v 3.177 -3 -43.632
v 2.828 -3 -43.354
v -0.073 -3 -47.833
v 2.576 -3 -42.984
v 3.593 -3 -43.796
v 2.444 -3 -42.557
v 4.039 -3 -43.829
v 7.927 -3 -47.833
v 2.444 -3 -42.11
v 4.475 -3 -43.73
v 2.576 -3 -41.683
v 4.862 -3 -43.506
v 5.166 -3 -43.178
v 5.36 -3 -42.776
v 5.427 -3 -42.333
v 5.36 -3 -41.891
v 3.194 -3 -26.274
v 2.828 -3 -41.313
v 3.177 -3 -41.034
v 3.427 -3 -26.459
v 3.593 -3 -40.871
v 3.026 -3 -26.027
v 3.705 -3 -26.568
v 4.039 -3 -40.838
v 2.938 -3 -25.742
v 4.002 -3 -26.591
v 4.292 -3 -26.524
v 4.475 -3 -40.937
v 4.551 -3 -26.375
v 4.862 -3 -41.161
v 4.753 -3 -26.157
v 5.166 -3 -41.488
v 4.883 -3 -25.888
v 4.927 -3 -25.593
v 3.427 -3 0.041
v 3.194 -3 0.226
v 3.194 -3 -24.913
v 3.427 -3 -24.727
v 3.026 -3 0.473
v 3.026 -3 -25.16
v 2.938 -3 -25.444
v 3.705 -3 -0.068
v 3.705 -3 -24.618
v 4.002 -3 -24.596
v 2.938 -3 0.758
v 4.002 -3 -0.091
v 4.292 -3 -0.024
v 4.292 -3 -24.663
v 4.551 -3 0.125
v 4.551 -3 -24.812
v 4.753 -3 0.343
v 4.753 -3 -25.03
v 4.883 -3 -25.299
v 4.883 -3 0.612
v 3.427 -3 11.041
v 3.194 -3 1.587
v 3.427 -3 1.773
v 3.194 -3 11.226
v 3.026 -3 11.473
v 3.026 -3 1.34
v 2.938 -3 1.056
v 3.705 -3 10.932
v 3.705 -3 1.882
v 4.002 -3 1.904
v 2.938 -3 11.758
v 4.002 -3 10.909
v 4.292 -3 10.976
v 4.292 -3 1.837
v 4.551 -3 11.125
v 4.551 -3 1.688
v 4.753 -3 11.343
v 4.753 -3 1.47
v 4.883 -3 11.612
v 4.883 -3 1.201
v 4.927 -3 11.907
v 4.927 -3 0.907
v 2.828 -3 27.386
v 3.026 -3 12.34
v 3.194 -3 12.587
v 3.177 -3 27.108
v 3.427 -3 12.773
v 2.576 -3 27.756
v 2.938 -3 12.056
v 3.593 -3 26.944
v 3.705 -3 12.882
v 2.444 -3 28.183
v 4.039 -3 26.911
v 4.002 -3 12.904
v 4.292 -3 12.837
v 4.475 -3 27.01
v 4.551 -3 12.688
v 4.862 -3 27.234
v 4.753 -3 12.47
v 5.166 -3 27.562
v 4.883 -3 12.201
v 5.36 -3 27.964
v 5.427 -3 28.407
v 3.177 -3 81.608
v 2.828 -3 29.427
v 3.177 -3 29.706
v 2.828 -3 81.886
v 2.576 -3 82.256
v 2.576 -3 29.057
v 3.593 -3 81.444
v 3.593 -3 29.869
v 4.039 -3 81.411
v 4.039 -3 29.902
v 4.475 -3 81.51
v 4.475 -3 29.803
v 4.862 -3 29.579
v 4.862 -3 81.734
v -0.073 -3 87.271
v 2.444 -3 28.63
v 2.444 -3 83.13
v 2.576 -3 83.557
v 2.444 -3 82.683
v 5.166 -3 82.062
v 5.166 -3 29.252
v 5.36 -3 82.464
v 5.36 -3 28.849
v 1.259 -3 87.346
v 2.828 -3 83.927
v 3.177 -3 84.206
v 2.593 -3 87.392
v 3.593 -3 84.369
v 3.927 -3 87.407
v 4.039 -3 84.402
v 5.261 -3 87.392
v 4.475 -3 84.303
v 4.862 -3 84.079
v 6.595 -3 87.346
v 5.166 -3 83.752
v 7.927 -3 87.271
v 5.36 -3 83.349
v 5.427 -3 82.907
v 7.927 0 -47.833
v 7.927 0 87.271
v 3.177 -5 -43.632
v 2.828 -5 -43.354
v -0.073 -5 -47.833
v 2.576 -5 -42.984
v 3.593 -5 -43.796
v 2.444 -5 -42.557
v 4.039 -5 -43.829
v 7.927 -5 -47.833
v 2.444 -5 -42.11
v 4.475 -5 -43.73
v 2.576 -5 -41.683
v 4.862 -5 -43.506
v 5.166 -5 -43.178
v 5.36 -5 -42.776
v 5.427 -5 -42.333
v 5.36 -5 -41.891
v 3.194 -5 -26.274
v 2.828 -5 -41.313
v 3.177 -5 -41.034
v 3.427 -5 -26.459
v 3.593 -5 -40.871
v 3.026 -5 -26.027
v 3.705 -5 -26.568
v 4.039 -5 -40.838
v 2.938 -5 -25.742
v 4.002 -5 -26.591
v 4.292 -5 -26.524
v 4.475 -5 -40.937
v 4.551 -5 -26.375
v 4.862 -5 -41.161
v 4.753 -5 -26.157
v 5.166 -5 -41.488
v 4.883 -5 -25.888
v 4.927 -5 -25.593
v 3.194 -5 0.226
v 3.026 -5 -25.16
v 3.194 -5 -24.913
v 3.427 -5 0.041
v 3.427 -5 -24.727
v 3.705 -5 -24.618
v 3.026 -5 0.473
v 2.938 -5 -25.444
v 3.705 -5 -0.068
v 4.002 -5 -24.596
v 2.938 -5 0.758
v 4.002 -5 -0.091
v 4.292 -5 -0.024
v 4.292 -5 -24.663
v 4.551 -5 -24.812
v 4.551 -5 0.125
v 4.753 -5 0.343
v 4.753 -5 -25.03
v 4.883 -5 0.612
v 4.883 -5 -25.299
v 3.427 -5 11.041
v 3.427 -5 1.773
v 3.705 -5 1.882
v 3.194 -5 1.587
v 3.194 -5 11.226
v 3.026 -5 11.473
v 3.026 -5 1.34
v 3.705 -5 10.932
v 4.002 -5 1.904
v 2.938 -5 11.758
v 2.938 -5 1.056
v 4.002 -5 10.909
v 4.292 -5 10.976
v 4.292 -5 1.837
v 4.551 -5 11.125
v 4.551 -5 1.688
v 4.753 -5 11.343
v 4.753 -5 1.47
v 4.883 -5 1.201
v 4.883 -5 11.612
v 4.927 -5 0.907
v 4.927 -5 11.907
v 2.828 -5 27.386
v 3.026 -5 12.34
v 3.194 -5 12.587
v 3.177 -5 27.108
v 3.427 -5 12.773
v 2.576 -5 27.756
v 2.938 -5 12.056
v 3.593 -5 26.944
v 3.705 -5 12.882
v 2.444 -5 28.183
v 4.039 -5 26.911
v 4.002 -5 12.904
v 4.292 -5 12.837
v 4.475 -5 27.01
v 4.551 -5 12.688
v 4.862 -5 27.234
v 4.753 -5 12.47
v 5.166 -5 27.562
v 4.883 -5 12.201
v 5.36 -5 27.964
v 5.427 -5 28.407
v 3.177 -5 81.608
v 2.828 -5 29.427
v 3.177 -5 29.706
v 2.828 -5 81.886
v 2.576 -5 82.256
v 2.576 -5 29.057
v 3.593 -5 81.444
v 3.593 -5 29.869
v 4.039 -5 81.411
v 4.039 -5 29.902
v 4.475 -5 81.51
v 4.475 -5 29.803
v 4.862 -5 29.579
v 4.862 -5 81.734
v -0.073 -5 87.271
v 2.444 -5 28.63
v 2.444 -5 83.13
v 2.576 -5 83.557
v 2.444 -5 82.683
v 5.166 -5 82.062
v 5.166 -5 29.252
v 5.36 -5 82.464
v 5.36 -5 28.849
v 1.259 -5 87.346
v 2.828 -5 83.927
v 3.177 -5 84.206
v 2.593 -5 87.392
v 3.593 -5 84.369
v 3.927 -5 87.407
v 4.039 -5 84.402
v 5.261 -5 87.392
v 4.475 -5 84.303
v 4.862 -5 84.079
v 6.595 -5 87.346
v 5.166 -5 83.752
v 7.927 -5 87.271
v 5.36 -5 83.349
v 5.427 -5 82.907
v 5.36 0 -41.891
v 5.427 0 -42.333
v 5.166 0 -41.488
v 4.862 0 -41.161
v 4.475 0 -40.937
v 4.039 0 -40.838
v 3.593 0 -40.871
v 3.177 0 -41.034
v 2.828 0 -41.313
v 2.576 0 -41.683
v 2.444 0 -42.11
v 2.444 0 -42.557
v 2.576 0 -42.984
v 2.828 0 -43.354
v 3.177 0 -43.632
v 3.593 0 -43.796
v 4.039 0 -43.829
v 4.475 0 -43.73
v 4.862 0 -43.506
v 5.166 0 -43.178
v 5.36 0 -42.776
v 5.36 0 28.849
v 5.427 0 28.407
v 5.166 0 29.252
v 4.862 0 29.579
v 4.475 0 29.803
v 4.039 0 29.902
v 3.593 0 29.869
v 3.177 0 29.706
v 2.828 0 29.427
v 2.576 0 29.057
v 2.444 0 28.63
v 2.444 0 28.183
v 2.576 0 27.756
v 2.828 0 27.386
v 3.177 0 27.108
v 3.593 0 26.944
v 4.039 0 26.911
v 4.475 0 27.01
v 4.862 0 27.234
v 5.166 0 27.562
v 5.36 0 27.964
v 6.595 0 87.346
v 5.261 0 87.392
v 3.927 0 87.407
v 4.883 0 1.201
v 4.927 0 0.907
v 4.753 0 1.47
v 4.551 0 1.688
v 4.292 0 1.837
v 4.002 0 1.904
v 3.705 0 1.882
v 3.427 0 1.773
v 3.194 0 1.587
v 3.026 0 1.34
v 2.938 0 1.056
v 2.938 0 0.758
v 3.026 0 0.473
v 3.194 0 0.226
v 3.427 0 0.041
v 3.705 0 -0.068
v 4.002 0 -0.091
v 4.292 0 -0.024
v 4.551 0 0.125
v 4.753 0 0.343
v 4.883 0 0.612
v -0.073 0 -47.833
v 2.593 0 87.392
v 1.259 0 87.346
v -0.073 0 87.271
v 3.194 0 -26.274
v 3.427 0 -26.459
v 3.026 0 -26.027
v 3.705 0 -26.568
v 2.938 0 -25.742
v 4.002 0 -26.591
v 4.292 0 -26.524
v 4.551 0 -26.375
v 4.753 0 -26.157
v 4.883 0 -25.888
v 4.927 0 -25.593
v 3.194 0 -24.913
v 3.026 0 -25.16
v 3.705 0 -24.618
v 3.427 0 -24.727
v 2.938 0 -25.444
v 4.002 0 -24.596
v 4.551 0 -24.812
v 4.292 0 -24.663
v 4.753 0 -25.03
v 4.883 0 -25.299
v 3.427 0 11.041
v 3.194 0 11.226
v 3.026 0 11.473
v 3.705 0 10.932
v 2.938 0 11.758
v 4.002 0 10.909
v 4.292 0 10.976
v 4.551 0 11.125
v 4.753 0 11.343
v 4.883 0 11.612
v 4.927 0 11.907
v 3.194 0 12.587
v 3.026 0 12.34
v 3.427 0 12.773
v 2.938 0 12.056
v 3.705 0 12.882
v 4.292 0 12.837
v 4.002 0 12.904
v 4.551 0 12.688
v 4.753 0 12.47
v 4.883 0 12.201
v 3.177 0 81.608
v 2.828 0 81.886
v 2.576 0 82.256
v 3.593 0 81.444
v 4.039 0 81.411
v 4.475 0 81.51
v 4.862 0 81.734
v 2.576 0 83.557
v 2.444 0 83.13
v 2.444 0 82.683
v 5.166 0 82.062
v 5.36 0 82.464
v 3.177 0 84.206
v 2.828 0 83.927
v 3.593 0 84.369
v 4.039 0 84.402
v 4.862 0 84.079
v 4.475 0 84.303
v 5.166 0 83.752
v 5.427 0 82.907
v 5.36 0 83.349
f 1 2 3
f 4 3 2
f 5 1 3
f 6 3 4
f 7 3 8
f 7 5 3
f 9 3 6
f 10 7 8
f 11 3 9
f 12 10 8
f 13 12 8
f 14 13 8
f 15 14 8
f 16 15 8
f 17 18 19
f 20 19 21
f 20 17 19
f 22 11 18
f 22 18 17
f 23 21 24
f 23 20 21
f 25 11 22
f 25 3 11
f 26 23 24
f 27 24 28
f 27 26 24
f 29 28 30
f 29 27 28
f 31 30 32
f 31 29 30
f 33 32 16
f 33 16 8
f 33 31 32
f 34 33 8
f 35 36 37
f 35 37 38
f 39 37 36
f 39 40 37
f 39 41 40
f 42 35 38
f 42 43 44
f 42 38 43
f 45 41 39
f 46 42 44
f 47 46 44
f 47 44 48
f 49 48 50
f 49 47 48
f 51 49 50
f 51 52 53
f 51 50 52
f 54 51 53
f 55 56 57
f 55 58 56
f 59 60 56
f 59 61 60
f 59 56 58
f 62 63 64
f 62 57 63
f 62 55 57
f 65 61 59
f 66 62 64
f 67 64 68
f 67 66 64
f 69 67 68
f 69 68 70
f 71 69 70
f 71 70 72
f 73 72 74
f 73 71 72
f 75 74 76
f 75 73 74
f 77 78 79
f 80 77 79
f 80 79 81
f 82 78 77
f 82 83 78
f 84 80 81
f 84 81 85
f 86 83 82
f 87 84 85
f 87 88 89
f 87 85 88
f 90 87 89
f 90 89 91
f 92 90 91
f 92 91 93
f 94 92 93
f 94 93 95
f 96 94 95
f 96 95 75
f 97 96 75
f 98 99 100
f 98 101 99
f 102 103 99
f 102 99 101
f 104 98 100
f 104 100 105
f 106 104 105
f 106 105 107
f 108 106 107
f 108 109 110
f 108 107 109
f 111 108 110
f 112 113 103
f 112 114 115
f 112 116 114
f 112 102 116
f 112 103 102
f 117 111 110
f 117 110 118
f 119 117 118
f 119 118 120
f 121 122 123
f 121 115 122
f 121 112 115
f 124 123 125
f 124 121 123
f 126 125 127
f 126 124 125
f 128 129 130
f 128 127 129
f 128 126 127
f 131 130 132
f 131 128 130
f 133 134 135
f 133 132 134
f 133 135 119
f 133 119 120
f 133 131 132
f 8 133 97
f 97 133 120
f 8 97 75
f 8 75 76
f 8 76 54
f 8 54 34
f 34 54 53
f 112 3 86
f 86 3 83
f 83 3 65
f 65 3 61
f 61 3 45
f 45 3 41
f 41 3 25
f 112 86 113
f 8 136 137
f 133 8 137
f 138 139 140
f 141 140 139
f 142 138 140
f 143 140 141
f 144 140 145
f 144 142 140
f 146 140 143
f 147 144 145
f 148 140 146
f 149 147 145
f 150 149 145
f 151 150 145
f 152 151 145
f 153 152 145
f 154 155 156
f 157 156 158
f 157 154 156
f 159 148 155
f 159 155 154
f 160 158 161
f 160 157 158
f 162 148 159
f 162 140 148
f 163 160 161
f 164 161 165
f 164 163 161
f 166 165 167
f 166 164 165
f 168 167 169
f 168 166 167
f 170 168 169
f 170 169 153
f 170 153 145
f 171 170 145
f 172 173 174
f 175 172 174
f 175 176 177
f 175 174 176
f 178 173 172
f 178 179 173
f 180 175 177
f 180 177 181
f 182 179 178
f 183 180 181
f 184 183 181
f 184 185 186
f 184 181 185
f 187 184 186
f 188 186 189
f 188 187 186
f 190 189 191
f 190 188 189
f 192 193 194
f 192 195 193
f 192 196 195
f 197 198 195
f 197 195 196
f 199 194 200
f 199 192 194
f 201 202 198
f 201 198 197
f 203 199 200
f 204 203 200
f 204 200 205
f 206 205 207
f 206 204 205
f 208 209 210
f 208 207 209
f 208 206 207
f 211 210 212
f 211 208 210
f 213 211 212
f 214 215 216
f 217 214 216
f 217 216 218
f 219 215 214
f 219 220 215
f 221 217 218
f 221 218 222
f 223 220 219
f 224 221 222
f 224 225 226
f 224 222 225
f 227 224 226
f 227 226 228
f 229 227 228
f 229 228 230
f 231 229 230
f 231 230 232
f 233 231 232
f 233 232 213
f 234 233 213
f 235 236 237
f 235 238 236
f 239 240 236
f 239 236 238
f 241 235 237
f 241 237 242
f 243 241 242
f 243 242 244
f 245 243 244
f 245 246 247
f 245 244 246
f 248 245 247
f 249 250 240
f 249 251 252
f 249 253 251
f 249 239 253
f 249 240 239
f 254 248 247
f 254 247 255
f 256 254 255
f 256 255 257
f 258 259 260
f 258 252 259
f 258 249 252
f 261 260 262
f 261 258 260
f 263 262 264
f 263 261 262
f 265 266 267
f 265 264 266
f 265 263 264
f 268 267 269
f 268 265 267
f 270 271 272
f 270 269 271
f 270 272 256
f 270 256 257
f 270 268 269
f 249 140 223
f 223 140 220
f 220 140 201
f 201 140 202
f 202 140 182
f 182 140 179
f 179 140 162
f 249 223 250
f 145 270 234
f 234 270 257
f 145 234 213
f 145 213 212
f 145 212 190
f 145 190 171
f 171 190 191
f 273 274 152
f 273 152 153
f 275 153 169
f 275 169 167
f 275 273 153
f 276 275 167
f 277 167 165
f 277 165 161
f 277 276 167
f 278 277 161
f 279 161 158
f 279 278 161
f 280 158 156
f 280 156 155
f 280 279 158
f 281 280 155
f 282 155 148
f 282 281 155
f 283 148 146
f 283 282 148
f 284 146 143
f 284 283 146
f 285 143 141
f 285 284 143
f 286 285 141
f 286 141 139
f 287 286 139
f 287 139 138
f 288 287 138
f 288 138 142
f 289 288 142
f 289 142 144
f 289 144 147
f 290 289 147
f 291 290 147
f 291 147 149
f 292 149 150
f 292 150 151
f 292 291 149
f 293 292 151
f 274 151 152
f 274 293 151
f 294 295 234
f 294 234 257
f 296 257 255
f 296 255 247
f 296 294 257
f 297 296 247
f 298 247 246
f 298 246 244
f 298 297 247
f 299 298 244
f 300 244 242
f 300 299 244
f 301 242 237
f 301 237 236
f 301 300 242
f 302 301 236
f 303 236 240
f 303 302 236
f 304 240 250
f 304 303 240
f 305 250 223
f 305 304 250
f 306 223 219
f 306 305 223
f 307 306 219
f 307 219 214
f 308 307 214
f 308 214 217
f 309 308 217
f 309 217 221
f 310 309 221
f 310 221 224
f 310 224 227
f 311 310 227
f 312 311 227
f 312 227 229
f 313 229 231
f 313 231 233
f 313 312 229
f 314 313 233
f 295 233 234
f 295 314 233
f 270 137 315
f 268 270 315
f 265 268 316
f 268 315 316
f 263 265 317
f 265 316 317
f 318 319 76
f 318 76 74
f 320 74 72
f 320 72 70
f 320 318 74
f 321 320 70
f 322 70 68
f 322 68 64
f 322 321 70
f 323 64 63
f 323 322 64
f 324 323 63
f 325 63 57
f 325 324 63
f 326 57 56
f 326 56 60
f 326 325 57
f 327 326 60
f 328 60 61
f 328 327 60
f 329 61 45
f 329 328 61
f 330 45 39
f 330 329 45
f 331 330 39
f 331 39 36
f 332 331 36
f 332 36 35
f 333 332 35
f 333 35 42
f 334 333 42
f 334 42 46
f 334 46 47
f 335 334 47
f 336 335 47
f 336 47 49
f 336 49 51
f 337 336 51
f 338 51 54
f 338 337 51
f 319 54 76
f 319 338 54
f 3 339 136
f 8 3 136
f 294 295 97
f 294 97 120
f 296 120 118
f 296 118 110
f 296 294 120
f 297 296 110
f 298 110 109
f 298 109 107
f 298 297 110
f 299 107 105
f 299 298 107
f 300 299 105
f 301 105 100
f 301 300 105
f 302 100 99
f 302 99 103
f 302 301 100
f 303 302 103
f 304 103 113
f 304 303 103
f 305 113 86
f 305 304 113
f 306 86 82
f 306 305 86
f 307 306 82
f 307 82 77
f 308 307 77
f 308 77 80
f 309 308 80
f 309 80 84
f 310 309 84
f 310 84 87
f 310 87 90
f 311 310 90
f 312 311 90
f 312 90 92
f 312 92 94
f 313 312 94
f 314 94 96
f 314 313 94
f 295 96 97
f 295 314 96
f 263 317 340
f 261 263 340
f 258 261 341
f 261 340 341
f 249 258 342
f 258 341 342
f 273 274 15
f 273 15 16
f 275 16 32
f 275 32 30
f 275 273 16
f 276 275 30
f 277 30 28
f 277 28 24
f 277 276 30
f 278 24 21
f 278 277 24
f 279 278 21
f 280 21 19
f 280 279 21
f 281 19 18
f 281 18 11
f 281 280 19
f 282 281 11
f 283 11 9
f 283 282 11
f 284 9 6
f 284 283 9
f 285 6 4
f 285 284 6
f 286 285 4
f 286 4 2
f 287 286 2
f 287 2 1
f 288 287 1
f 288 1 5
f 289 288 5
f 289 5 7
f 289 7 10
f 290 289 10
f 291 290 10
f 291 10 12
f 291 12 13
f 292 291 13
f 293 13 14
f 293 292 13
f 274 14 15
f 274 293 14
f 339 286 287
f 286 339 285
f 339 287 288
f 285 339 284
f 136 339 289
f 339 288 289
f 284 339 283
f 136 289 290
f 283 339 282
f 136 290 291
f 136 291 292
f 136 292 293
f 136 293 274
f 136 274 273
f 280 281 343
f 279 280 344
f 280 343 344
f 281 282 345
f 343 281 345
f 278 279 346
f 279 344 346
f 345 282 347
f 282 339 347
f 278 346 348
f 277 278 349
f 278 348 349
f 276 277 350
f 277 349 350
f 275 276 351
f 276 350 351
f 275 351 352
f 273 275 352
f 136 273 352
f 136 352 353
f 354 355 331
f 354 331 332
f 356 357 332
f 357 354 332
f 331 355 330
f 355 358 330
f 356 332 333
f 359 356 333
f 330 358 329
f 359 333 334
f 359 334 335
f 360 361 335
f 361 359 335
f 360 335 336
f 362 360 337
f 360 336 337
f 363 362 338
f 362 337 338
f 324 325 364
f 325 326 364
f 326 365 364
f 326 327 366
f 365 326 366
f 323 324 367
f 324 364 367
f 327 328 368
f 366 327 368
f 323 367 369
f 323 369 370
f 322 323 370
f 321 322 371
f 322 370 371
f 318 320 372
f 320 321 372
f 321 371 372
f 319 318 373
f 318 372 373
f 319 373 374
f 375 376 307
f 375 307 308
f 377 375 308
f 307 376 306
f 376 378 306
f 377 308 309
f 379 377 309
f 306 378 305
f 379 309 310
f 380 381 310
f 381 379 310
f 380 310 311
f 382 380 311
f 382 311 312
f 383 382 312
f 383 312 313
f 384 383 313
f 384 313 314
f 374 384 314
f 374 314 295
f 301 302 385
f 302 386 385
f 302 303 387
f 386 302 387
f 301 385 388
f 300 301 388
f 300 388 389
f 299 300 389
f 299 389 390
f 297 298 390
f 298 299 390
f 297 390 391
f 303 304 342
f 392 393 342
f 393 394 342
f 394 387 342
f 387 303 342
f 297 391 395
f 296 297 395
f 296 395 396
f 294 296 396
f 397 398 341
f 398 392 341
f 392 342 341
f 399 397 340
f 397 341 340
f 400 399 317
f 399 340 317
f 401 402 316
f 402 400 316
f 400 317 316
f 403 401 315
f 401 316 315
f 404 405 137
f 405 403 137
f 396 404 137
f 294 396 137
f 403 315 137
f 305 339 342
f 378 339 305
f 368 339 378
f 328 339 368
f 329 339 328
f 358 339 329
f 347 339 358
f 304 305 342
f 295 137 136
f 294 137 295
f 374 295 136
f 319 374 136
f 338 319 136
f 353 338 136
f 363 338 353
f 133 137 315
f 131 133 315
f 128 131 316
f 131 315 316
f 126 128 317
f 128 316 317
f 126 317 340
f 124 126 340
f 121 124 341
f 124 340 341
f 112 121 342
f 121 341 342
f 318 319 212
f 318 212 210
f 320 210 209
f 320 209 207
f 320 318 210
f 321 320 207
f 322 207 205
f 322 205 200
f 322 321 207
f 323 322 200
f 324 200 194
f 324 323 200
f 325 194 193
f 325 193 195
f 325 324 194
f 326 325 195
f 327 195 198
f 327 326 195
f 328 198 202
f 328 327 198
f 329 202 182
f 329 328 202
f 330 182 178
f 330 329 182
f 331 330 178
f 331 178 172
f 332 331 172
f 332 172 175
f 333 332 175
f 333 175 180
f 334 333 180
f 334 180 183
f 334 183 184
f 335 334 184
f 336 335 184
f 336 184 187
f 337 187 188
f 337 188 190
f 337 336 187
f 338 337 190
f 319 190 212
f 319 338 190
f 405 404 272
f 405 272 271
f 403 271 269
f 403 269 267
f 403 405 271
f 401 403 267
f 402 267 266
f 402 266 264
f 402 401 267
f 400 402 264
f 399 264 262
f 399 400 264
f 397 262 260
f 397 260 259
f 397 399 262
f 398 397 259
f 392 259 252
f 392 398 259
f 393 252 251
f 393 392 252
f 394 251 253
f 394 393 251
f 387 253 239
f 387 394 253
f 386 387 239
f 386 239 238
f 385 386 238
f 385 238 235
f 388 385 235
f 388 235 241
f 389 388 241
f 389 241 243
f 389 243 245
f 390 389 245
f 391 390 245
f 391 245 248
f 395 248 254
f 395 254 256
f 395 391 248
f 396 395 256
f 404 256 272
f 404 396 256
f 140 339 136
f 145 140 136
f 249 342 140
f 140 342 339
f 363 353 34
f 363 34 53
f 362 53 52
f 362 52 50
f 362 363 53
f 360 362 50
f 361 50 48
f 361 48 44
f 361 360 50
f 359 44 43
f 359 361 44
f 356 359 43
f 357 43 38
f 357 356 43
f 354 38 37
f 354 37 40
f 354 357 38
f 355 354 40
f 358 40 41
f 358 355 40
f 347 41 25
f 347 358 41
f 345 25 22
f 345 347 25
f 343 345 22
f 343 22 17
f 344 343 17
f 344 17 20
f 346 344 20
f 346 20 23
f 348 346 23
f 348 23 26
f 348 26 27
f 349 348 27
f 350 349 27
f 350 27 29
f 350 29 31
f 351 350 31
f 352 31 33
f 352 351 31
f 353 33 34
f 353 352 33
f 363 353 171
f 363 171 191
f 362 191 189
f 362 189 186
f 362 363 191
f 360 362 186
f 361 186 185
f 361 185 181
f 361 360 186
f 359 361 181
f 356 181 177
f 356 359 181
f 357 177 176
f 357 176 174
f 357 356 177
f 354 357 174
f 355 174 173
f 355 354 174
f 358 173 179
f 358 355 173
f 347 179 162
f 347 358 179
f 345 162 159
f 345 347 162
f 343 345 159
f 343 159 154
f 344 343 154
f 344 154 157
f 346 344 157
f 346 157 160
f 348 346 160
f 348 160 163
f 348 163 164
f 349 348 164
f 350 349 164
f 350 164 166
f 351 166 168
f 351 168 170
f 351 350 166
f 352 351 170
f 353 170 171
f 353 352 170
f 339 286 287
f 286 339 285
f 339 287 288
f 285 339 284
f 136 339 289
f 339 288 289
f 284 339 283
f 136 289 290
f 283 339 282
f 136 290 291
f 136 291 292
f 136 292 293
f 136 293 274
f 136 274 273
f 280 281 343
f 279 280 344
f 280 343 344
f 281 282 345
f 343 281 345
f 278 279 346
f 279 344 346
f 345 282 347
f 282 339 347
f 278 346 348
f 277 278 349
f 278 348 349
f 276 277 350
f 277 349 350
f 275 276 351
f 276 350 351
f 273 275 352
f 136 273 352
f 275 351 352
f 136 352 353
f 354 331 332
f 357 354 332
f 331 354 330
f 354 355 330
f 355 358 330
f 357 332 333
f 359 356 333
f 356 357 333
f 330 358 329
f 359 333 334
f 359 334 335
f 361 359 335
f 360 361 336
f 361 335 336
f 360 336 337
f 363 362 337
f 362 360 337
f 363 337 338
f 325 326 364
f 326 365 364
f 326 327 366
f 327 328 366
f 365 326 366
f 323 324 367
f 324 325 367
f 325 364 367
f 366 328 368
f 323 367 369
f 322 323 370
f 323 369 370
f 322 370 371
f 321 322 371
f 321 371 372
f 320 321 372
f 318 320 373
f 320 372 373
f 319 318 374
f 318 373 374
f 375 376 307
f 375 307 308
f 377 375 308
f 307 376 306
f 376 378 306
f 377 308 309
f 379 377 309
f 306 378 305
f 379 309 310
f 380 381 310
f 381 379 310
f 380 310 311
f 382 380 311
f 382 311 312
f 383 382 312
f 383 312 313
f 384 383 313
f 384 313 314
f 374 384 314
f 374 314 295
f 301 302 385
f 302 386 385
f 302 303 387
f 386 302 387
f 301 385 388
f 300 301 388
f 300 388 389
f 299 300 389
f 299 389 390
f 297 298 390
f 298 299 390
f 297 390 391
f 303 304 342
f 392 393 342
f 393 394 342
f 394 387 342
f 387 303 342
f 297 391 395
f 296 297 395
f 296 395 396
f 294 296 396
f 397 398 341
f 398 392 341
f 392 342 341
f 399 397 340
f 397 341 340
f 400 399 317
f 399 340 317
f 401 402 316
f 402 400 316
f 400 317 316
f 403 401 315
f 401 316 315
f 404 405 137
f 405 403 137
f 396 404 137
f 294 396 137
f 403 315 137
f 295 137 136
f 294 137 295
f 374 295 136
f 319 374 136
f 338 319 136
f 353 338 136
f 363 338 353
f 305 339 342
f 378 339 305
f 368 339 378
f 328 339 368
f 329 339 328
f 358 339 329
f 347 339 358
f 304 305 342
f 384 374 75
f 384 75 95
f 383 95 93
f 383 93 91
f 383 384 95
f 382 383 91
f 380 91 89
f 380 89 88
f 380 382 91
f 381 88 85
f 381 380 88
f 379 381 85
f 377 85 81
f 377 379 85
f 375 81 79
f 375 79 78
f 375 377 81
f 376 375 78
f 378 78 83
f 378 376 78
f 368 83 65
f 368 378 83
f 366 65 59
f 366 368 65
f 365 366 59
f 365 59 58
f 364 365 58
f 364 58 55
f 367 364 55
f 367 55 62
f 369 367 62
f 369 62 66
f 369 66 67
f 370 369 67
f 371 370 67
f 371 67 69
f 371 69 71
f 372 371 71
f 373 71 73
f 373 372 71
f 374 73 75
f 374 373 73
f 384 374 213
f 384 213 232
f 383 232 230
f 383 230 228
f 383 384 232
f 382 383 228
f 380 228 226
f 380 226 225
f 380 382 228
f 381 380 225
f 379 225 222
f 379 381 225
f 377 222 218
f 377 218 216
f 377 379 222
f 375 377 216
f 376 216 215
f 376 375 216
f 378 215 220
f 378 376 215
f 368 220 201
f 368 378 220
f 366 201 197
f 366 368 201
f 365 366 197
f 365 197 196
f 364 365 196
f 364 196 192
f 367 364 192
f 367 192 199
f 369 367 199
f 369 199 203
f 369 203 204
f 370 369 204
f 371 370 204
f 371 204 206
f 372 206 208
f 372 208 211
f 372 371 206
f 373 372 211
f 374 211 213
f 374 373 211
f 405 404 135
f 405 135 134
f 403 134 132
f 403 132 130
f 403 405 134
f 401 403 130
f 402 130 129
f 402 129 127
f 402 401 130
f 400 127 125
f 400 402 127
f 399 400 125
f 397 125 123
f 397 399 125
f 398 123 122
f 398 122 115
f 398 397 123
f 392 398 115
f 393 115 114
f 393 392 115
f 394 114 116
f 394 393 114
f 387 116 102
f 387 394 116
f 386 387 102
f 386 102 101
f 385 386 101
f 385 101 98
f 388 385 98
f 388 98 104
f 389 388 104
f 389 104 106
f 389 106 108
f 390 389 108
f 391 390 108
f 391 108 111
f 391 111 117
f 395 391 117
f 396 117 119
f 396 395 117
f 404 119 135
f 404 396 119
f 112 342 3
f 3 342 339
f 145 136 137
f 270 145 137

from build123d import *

# Parameters (mm, degrees)
F0_W     = 8
F0_H     = 9.6326530612
F0_R     = 1.5
F0_R_2   = 1
F1_DEPTH = 5
F2_DEPTH = 3


# Not quite as in the source:
# - a feature names something its author has since deleted; it is built from what else it names


with BuildPart() as f1:
    # F0 (on Front) → F1 (new body)
    with BuildSketch(Plane.XZ):
        with BuildLine():
            Line((-0.072881, 79.2495112755), (-0.072881, 33.2229425306))
            Line((-0.072881, 33.2229425306), (7.927119, 33.2229425306))
            Line((7.927119, 33.2229425306), (7.927119, 79.2495112755))
            ThreePointArc((7.927119, 79.2495112755), (3.927119, 79.406616), (-0.072881, 79.2495112755))
        make_face()
        with Locations((3.927119, 28.406616)):
            Rectangle(F0_W, F0_H)
        with Locations((3.927119, 28.406616)):
            Circle(F0_R, mode=Mode.SUBTRACT)
        with BuildLine():
            Line((7.927119, 23.5902894694), (-0.072881, 23.5902894694))
            Line((-0.072881, 23.5902894694), (-0.072881, -22.4362792755))
            ThreePointArc((-0.072881, -22.4362792755), (3.927119, -22.593384), (7.927119, -22.4362792755))
            Line((7.927119, -22.4362792755), (7.927119, 23.5902894694))
        make_face()
        with Locations((3.927119, 0.906616)):
            Circle(F0_R_2, mode=Mode.SUBTRACT)
        with Locations((3.927119, 11.906616)):
            Circle(F0_R_2, mode=Mode.SUBTRACT)
        with BuildLine():
            Line((-0.072881, 87.270866611), (-0.072881, 79.2495112755))
            ThreePointArc((-0.072881, 79.2495112755), (3.927119, 79.406616), (7.927119, 79.2495112755))
            Line((7.927119, 79.2495112755), (7.927119, 87.270866611))
            ThreePointArc((7.927119, 87.270866611), (5.9282704121, 87.3726688866), (3.927119, 87.406616))
            ThreePointArc((3.927119, 87.406616), (1.9259675879, 87.3726688866), (-0.072881, 87.270866611))
        make_face()
        with Locations((3.927119, 82.906616)):
            Circle(F0_R, mode=Mode.SUBTRACT)
        with BuildLine():
            ThreePointArc((7.927119, -22.4362792755), (3.927119, -22.593384), (-0.072881, -22.4362792755))
            Line((-0.072881, -22.4362792755), (-0.072881, -30.457634611))
            ThreePointArc((-0.072881, -30.457634611), (3.927119, -30.593384), (7.927119, -30.457634611))
            Line((7.927119, -30.457634611), (7.927119, -22.4362792755))
        make_face()
        with Locations((3.927119, -25.593384)):
            Circle(F0_R_2, mode=Mode.SUBTRACT)
        with BuildLine():
            ThreePointArc((7.927119, -30.457634611), (3.927119, -30.593384), (-0.072881, -30.457634611))
            Line((-0.072881, -30.457634611), (-0.072881, -47.833384))
            Line((-0.072881, -47.833384), (7.927119, -47.833384))
            Line((7.927119, -47.833384), (7.927119, -30.457634611))
        make_face()
        with Locations((3.927119, -42.333384)):
            Circle(F0_R, mode=Mode.SUBTRACT)
    extrude(amount=F1_DEPTH)


with BuildPart() as f2:
    # F0 (on Front) → F2 (new body)
    with BuildSketch(Plane.XZ):
        with BuildLine():
            Line((7.927119, 23.5902894694), (-0.072881, 23.5902894694))
            Line((-0.072881, 23.5902894694), (-0.072881, -22.4362792755))
            ThreePointArc((-0.072881, -22.4362792755), (3.927119, -22.593384), (7.927119, -22.4362792755))
            Line((7.927119, -22.4362792755), (7.927119, 23.5902894694))
        make_face()
        with Locations((3.927119, 0.906616)):
            Circle(F0_R_2, mode=Mode.SUBTRACT)
        with Locations((3.927119, 11.906616)):
            Circle(F0_R_2, mode=Mode.SUBTRACT)
        with BuildLine():
            ThreePointArc((7.927119, -22.4362792755), (3.927119, -22.593384), (-0.072881, -22.4362792755))
            Line((-0.072881, -22.4362792755), (-0.072881, -30.457634611))
            ThreePointArc((-0.072881, -30.457634611), (3.927119, -30.593384), (7.927119, -30.457634611))
            Line((7.927119, -30.457634611), (7.927119, -22.4362792755))
        make_face()
        with Locations((3.927119, -25.593384)):
            Circle(F0_R_2, mode=Mode.SUBTRACT)
        with BuildLine():
            ThreePointArc((7.927119, -30.457634611), (3.927119, -30.593384), (-0.072881, -30.457634611))
            Line((-0.072881, -30.457634611), (-0.072881, -47.833384))
            Line((-0.072881, -47.833384), (7.927119, -47.833384))
            Line((7.927119, -47.833384), (7.927119, -30.457634611))
        make_face()
        with Locations((3.927119, -42.333384)):
            Circle(F0_R, mode=Mode.SUBTRACT)
        with Locations((3.927119, 28.406616)):
            Rectangle(F0_W, F0_H)
        with Locations((3.927119, 28.406616)):
            Circle(F0_R, mode=Mode.SUBTRACT)
        with BuildLine():
            Line((-0.072881, 79.2495112755), (-0.072881, 33.2229425306))
            Line((-0.072881, 33.2229425306), (7.927119, 33.2229425306))
            Line((7.927119, 33.2229425306), (7.927119, 79.2495112755))
            ThreePointArc((7.927119, 79.2495112755), (3.927119, 79.406616), (-0.072881, 79.2495112755))
        make_face()
        with BuildLine():
            Line((-0.072881, 87.270866611), (-0.072881, 79.2495112755))
            ThreePointArc((-0.072881, 79.2495112755), (3.927119, 79.406616), (7.927119, 79.2495112755))
            Line((7.927119, 79.2495112755), (7.927119, 87.270866611))
            ThreePointArc((7.927119, 87.270866611), (5.9282704121, 87.3726688866), (3.927119, 87.406616))
            ThreePointArc((3.927119, 87.406616), (1.9259675879, 87.3726688866), (-0.072881, 87.270866611))
        make_face()
        with Locations((3.927119, 82.906616)):
            Circle(F0_R, mode=Mode.SUBTRACT)
    extrude(amount=F2_DEPTH)


solid = Compound([f1.part, f2.part])
